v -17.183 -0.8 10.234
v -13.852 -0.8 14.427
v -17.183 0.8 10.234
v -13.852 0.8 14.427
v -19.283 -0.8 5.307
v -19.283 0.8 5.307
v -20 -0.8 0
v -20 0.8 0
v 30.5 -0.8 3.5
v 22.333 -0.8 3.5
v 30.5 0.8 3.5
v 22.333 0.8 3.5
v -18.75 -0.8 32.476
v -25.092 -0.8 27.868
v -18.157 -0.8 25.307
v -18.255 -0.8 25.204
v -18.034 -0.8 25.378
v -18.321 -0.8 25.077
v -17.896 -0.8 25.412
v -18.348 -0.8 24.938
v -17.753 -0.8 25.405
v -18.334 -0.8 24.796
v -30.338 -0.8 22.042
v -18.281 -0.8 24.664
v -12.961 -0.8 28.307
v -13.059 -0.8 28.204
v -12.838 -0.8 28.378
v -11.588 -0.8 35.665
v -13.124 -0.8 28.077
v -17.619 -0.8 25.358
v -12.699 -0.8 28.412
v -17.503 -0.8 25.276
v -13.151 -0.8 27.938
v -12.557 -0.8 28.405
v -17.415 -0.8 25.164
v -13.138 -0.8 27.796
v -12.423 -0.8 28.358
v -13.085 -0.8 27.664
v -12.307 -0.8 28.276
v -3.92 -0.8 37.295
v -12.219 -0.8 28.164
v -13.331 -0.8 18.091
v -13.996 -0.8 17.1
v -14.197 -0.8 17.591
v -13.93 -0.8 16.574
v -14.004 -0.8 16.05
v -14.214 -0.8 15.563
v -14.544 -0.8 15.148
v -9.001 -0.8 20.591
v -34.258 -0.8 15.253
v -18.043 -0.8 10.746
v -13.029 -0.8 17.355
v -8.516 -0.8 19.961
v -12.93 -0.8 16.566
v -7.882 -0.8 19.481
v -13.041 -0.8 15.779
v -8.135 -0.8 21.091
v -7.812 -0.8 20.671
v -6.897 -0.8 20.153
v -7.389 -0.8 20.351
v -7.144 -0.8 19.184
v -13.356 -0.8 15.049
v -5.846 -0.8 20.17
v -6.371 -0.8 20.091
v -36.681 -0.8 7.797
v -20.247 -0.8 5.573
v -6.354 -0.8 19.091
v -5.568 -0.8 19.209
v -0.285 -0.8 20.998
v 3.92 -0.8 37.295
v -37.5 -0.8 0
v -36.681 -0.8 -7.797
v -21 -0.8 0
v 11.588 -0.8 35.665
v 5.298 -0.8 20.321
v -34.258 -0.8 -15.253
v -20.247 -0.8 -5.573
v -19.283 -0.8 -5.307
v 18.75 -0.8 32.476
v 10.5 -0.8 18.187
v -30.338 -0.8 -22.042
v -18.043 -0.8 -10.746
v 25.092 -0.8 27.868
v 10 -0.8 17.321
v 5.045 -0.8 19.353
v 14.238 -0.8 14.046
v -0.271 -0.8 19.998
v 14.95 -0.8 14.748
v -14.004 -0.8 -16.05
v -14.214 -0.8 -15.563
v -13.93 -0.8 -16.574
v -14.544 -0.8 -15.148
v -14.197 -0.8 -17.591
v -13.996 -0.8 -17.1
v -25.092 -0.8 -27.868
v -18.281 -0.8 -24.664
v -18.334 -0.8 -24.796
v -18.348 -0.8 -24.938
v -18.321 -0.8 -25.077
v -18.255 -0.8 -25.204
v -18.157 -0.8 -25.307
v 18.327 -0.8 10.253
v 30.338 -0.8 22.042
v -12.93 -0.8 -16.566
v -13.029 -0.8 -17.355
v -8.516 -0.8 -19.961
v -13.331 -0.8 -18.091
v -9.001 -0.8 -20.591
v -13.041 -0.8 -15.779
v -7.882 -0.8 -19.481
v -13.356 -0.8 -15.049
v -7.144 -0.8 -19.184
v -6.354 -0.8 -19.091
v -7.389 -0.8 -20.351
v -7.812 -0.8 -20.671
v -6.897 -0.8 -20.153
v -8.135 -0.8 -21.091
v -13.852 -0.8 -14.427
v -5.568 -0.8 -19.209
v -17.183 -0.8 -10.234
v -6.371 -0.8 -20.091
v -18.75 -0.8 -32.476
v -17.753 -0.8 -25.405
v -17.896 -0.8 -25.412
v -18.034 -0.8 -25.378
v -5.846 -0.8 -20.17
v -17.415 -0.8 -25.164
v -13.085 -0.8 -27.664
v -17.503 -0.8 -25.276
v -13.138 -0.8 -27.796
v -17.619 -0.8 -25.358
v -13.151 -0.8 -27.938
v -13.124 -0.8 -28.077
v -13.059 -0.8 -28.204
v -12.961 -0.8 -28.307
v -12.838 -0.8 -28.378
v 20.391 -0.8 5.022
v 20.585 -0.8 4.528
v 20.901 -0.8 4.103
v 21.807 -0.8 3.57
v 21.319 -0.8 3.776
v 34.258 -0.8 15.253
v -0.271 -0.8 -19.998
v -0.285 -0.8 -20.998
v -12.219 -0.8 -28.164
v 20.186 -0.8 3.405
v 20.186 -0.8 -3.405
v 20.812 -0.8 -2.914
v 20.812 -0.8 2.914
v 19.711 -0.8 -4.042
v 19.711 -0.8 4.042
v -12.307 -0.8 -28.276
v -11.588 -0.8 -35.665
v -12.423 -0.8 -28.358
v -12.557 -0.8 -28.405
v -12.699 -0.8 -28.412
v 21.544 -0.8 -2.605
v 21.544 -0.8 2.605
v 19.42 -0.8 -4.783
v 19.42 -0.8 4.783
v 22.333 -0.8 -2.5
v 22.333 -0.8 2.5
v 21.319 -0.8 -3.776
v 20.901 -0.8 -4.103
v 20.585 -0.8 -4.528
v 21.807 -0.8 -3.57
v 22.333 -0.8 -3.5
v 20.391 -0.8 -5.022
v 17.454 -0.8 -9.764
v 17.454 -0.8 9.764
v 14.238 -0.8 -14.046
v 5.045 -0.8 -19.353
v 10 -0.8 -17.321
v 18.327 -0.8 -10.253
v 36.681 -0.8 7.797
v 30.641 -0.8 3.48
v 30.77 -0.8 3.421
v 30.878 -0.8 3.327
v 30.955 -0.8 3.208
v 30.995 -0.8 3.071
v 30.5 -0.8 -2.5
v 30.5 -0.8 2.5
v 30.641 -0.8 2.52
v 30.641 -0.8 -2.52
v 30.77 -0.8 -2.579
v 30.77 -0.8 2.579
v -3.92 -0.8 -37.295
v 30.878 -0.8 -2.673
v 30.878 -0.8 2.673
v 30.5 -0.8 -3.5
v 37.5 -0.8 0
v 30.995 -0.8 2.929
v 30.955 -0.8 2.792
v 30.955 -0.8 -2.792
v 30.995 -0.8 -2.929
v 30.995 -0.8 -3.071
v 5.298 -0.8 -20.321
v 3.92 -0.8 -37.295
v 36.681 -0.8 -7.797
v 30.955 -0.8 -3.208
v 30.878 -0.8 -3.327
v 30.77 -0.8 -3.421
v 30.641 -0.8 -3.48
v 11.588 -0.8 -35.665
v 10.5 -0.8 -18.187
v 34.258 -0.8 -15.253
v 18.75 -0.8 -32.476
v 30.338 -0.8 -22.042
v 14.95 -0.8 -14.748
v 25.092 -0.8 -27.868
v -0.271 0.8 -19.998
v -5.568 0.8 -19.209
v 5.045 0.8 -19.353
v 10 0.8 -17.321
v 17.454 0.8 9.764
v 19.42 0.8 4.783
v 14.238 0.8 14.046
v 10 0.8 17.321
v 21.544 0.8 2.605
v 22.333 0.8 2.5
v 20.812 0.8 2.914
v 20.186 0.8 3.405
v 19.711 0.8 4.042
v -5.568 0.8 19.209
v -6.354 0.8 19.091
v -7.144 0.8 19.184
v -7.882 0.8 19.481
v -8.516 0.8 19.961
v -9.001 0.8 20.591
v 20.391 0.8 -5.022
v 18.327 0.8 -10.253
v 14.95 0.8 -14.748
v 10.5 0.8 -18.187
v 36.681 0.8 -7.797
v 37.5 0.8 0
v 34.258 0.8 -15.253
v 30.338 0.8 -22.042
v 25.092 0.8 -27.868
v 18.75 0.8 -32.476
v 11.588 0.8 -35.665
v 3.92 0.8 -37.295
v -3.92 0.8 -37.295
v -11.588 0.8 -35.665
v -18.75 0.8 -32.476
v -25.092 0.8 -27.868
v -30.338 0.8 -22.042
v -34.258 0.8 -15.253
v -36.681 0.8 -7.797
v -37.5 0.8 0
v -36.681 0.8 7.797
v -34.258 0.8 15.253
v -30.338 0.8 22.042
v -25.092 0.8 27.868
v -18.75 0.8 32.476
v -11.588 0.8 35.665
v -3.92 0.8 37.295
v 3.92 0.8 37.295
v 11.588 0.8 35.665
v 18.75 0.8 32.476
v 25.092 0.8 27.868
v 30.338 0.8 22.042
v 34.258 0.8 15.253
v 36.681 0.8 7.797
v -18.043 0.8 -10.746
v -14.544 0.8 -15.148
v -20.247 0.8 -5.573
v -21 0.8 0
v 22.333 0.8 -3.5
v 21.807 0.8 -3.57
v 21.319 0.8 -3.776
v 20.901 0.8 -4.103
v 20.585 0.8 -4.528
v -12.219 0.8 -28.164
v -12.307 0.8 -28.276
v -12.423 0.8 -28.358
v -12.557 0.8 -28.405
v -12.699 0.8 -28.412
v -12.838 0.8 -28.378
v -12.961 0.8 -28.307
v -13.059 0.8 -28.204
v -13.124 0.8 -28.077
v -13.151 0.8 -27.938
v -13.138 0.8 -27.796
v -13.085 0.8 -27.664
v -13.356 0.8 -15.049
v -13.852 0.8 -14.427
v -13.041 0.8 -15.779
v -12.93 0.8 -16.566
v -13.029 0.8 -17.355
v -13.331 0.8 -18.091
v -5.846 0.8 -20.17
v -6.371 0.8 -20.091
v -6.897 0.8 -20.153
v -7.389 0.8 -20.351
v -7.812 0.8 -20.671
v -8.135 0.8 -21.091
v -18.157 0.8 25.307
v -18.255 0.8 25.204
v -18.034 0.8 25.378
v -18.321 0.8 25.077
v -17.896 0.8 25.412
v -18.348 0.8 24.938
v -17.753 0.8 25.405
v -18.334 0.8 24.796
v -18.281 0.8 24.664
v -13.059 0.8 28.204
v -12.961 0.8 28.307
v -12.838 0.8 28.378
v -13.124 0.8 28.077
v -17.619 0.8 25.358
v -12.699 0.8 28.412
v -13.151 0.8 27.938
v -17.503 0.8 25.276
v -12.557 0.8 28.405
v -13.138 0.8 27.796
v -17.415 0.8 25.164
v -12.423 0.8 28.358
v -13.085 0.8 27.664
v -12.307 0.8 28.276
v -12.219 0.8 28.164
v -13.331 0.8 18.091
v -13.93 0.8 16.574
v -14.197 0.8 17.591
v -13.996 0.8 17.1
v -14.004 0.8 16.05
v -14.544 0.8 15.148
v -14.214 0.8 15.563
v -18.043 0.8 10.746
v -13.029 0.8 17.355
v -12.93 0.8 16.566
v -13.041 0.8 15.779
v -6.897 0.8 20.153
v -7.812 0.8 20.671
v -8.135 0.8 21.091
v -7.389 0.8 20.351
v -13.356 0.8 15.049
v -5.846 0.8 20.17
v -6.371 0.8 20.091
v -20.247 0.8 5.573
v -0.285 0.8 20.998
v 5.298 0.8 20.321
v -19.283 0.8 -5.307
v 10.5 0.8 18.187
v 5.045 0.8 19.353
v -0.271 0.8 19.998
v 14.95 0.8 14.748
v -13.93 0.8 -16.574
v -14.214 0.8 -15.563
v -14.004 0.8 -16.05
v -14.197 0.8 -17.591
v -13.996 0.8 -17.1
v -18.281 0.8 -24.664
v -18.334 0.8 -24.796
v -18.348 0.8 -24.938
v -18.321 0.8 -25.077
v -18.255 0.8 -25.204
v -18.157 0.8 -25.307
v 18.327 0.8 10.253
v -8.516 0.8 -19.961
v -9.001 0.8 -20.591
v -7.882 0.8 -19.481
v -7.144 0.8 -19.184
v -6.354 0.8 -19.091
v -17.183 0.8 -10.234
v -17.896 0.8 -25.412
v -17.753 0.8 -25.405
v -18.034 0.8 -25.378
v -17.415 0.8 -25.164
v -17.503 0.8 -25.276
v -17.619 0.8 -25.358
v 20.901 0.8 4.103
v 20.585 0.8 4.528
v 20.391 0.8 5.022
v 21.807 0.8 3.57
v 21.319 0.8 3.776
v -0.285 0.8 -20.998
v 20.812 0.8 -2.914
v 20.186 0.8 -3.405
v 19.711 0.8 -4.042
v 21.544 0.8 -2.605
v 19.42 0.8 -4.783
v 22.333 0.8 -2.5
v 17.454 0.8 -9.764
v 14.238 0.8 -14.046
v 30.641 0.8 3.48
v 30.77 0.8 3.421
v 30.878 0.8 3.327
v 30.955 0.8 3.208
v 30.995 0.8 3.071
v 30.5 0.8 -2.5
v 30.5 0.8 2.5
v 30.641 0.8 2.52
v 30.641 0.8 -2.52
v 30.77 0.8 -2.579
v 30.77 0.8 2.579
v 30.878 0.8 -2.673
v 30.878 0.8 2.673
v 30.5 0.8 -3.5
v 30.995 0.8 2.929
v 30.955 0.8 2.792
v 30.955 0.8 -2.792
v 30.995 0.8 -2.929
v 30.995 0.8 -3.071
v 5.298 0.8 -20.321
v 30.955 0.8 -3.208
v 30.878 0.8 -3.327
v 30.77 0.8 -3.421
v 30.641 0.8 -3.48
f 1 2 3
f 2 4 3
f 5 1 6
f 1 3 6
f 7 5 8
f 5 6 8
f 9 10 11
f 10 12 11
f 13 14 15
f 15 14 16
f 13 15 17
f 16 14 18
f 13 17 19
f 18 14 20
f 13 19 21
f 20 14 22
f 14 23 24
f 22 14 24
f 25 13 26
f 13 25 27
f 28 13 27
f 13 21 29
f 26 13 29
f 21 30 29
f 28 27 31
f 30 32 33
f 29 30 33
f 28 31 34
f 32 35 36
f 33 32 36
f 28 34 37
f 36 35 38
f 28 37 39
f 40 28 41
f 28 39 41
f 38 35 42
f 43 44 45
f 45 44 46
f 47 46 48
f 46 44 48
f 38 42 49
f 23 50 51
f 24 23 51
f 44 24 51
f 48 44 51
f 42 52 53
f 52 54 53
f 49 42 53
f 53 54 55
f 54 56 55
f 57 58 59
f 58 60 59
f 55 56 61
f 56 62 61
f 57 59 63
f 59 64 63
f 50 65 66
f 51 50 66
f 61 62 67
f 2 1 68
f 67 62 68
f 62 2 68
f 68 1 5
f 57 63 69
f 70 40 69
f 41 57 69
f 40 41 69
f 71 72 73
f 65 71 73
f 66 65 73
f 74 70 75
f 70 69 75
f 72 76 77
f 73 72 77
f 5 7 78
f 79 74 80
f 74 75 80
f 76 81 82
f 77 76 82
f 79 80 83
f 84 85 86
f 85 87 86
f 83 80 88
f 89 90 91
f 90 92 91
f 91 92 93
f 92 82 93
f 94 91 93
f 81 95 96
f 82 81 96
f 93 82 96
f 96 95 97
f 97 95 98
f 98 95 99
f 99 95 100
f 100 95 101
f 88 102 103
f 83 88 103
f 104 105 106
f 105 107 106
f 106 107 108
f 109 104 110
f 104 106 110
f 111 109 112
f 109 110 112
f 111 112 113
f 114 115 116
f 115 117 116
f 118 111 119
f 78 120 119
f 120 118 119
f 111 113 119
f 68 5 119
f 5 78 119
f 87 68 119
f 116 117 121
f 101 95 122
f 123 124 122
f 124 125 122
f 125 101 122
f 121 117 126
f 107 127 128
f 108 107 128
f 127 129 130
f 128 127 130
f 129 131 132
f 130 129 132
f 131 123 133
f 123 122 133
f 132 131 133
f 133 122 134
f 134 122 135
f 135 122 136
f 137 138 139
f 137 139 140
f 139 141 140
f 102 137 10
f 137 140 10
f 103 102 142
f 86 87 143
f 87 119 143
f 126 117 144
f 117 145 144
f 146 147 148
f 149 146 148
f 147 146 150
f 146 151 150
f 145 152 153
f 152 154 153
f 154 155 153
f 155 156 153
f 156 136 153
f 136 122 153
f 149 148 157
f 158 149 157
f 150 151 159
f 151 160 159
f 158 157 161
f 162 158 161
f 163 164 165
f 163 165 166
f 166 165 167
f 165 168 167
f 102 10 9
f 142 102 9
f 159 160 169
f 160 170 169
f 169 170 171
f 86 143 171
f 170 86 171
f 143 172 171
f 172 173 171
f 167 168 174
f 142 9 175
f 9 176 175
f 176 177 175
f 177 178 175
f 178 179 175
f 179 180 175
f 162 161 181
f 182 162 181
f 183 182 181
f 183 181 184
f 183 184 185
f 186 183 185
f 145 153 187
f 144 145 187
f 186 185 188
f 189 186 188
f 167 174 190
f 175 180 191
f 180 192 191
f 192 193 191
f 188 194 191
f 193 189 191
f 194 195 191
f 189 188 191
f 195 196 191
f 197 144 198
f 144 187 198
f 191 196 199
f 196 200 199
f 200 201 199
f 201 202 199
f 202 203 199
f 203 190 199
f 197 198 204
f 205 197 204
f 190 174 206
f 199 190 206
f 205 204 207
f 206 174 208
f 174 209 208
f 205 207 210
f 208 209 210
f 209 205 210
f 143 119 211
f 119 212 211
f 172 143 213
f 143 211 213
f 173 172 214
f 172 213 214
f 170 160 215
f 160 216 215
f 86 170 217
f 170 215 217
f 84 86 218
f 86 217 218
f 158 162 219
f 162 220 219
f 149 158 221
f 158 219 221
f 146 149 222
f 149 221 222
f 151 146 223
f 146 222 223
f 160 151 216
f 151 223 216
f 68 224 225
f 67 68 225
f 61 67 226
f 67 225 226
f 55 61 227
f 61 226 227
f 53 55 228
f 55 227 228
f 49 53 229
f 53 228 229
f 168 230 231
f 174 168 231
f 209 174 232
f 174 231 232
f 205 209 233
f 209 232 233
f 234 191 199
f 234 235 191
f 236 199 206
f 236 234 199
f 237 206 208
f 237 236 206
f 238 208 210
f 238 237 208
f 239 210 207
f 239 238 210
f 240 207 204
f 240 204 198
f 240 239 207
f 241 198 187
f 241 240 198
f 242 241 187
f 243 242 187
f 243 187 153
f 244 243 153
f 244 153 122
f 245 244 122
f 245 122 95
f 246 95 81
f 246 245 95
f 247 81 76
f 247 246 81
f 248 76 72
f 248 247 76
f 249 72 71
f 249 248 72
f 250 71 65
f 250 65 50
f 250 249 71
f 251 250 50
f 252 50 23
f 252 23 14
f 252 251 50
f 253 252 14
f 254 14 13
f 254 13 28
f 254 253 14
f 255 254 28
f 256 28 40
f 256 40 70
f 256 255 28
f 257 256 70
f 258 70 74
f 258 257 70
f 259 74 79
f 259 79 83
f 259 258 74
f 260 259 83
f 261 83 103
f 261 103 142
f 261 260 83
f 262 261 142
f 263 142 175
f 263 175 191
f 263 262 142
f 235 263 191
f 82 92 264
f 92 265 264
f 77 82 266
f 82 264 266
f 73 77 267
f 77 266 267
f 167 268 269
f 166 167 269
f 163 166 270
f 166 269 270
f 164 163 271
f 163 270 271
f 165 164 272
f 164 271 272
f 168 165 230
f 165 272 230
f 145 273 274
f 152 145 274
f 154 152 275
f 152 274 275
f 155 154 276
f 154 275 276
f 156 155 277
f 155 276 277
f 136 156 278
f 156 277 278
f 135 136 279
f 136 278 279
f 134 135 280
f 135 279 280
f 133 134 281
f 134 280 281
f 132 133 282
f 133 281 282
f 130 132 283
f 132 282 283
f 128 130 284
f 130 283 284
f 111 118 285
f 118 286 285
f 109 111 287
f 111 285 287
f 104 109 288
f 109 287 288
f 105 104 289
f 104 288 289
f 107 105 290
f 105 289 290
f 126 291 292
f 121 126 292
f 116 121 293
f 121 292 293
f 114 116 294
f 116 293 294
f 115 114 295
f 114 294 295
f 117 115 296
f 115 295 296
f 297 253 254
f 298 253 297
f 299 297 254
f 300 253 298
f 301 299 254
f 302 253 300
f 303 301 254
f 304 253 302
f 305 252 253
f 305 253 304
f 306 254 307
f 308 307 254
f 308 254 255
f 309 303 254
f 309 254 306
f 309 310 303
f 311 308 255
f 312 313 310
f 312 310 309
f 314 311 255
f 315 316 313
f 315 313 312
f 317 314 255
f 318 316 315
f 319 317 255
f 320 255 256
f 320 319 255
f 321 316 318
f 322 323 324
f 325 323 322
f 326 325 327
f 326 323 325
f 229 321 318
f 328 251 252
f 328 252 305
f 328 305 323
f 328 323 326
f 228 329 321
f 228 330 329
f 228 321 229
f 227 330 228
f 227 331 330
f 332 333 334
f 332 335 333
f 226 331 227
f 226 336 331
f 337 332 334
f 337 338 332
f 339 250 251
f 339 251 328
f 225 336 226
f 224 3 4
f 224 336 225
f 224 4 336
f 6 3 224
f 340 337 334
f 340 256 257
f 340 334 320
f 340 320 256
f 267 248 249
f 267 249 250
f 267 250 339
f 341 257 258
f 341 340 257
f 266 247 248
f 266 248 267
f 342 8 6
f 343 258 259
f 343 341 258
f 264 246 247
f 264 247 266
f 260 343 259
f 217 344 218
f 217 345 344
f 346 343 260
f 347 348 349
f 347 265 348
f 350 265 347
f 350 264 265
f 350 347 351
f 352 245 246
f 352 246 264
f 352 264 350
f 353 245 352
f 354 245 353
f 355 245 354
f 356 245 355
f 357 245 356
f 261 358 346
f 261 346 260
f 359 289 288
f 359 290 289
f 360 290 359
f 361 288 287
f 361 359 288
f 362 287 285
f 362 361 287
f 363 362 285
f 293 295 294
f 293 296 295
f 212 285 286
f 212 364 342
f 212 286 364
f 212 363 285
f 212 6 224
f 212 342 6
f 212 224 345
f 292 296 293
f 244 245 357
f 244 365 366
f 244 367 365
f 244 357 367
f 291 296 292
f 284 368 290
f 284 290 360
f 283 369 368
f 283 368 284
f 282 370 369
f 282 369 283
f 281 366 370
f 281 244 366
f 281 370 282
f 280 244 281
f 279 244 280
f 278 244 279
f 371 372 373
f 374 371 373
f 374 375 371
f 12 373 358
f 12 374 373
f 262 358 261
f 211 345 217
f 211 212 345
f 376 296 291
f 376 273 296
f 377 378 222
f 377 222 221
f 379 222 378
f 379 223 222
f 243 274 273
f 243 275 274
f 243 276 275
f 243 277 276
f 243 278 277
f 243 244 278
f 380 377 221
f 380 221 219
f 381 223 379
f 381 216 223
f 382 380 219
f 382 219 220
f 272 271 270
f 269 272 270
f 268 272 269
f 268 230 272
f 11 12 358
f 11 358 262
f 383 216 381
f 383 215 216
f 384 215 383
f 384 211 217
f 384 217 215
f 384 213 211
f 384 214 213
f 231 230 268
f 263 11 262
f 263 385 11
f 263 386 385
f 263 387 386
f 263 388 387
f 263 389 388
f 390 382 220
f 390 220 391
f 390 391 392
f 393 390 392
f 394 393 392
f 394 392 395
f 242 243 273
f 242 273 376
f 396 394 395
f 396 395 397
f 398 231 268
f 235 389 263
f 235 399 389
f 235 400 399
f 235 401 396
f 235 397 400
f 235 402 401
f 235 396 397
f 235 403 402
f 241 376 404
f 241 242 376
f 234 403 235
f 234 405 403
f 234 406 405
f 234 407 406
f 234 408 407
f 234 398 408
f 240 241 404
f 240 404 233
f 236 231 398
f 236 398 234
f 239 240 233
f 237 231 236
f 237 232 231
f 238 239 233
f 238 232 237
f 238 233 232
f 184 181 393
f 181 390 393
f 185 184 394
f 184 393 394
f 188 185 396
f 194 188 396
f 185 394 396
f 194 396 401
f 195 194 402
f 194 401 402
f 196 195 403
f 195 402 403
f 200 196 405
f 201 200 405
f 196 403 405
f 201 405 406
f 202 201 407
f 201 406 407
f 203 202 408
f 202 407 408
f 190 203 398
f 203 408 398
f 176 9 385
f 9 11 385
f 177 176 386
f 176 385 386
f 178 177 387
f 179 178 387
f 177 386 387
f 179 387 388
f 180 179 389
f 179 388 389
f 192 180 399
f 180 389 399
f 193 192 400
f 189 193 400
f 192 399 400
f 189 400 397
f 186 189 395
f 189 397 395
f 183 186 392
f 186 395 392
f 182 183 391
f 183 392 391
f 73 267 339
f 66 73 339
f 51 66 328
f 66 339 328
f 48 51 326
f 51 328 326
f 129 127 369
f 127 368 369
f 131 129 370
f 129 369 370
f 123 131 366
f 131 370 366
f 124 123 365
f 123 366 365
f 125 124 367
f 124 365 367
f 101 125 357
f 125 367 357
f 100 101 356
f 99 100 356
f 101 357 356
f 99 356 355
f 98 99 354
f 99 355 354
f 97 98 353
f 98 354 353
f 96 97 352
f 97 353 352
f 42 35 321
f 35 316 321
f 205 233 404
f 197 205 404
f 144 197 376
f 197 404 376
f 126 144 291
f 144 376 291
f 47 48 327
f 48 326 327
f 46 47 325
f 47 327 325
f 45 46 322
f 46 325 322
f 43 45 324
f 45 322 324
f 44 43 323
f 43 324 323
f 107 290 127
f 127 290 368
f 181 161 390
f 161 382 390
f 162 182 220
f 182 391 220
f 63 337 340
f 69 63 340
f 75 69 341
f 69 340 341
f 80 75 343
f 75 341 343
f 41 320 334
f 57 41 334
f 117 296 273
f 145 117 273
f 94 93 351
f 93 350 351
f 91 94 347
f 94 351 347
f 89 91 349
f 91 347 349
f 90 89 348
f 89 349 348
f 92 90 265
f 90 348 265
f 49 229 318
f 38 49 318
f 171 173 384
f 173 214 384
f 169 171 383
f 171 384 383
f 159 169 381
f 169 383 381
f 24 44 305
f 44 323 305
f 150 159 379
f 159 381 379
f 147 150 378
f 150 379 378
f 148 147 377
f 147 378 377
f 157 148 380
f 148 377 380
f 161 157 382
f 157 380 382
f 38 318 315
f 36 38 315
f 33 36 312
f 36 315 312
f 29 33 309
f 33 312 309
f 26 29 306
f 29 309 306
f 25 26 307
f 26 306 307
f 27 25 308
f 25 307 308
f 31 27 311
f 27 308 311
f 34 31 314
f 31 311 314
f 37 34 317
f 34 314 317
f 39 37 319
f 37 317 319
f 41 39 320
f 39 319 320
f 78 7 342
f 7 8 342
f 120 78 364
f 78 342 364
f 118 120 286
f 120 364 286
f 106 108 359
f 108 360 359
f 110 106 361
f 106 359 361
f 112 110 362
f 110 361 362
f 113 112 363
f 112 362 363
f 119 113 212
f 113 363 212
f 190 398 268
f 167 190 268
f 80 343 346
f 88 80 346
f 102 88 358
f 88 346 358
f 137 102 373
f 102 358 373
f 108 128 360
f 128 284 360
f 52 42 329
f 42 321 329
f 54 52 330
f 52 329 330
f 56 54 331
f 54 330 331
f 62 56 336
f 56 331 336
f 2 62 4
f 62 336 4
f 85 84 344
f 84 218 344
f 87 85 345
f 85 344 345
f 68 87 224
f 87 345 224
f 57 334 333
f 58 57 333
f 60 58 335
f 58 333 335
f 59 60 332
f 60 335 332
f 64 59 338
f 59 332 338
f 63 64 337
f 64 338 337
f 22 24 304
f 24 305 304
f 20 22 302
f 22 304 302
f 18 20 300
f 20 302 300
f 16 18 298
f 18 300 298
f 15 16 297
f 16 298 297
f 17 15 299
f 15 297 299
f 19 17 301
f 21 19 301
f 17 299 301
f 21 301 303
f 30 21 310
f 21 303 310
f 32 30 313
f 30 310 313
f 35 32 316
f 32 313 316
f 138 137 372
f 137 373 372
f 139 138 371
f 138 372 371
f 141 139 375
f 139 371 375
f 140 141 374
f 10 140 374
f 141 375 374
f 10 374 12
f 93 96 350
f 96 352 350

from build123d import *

# Parameters (mm, degrees)
SKETCH1_R           = 37.5
BOSS_EXTRUDE1_DEPTH = 0.8


with BuildPart() as part:
    # Sketch1 → Boss-Extrude1 (new body, symmetric)
    with BuildSketch(Plane(origin=(0, 0, 0), x_dir=(1, 0, 0), z_dir=(0, 1, 0))):
        Circle(SKETCH1_R)
        with BuildLine():
            ThreePointArc((-12.218911, 28.163775), (-12.901924, 28.346788), (-13.084936, 27.663775))
            Line((-13.084936, 27.663775), (-9.001292, 20.590695))
            ThreePointArc((-9.001292, 20.590695), (-7.523035, 19.307531), (-5.568014, 19.2093))
            ThreePointArc((-5.568014, 19.2093), (2.40884, 19.854407), (10, 17.320508))
            ThreePointArc((10, 17.320508), (15.990001, 12.01332), (19.419749, 4.782609))
            ThreePointArc((19.419749, 4.782609), (20.48233, 3.138626), (22.332711, 2.5))
            Line((22.332711, 2.5), (30.5, 2.5))
            ThreePointArc((30.5, 2.5), (31, 3), (30.5, 3.5))
            Line((30.5, 3.5), (22.332711, 3.5))
            ThreePointArc((22.332711, 3.5), (21.099124, 3.925751), (20.390737, 5.021739))
            ThreePointArc((20.390737, 5.021739), (16.789501, 12.613986), (10.5, 18.186533))
            ThreePointArc((10.5, 18.186533), (2.529282, 20.847128), (-5.846415, 20.169765))
            ThreePointArc((-5.846415, 20.169765), (-7.149762, 20.235252), (-8.135267, 21.090695))
            Line((-8.135267, 21.090695), (-12.218911, 28.163775))
        make_face(mode=Mode.SUBTRACT)
        with BuildLine():
            ThreePointArc((10.5, -18.186533), (16.789501, -12.613986), (20.390737, -5.021739))
            ThreePointArc((20.390737, -5.021739), (21.099124, -3.925751), (22.332711, -3.5))
            Line((22.332711, -3.5), (30.5, -3.5))
            ThreePointArc((30.5, -3.5), (31, -3), (30.5, -2.5))
            Line((30.5, -2.5), (22.332711, -2.5))
            ThreePointArc((22.332711, -2.5), (20.48233, -3.138626), (19.419749, -4.782609))
            ThreePointArc((19.419749, -4.782609), (15.990001, -12.01332), (10, -17.320508))
            ThreePointArc((10, -17.320508), (2.40884, -19.854407), (-5.568014, -19.2093))
            ThreePointArc((-5.568014, -19.2093), (-7.523035, -19.307531), (-9.001292, -20.590695))
            Line((-9.001292, -20.590695), (-13.084936, -27.663775))
            ThreePointArc((-13.084936, -27.663775), (-12.901924, -28.346788), (-12.218911, -28.163775))
            Line((-12.218911, -28.163775), (-8.135267, -21.090695))
            ThreePointArc((-8.135267, -21.090695), (-7.149762, -20.235252), (-5.846415, -20.169765))
            ThreePointArc((-5.846415, -20.169765), (2.529282, -20.847128), (10.5, -18.186533))
        make_face(mode=Mode.SUBTRACT)
        with BuildLine():
            ThreePointArc((-21, 0), (-19.318783, -8.233142), (-14.544322, -15.148026))
            ThreePointArc((-14.544322, -15.148026), (-13.949362, -16.309502), (-14.197445, -17.590695))
            Line((-14.197445, -17.590695), (-18.281089, -24.663775))
            ThreePointArc((-18.281089, -24.663775), (-18.098076, -25.346788), (-17.415064, -25.163775))
            Line((-17.415064, -25.163775), (-13.331419, -18.090695))
            ThreePointArc((-13.331419, -18.090695), (-12.959295, -16.168905), (-13.851735, -14.426692))
            ThreePointArc((-13.851735, -14.426692), (-18.398841, -7.841087), (-20, 0))
            ThreePointArc((-20, 0), (-18.398841, 7.841087), (-13.851735, 14.426692))
            ThreePointArc((-13.851735, 14.426692), (-12.959295, 16.168905), (-13.331419, 18.090695))
            Line((-13.331419, 18.090695), (-17.415064, 25.163775))
            ThreePointArc((-17.415064, 25.163775), (-18.098076, 25.346788), (-18.281089, 24.663775))
            Line((-18.281089, 24.663775), (-14.197445, 17.590695))
            ThreePointArc((-14.197445, 17.590695), (-13.949362, 16.309502), (-14.544322, 15.148026))
            ThreePointArc((-14.544322, 15.148026), (-19.318783, 8.233142), (-21, 0))
        make_face(mode=Mode.SUBTRACT)
    extrude(amount=BOSS_EXTRUDE1_DEPTH, both=True)


solid = part.part
